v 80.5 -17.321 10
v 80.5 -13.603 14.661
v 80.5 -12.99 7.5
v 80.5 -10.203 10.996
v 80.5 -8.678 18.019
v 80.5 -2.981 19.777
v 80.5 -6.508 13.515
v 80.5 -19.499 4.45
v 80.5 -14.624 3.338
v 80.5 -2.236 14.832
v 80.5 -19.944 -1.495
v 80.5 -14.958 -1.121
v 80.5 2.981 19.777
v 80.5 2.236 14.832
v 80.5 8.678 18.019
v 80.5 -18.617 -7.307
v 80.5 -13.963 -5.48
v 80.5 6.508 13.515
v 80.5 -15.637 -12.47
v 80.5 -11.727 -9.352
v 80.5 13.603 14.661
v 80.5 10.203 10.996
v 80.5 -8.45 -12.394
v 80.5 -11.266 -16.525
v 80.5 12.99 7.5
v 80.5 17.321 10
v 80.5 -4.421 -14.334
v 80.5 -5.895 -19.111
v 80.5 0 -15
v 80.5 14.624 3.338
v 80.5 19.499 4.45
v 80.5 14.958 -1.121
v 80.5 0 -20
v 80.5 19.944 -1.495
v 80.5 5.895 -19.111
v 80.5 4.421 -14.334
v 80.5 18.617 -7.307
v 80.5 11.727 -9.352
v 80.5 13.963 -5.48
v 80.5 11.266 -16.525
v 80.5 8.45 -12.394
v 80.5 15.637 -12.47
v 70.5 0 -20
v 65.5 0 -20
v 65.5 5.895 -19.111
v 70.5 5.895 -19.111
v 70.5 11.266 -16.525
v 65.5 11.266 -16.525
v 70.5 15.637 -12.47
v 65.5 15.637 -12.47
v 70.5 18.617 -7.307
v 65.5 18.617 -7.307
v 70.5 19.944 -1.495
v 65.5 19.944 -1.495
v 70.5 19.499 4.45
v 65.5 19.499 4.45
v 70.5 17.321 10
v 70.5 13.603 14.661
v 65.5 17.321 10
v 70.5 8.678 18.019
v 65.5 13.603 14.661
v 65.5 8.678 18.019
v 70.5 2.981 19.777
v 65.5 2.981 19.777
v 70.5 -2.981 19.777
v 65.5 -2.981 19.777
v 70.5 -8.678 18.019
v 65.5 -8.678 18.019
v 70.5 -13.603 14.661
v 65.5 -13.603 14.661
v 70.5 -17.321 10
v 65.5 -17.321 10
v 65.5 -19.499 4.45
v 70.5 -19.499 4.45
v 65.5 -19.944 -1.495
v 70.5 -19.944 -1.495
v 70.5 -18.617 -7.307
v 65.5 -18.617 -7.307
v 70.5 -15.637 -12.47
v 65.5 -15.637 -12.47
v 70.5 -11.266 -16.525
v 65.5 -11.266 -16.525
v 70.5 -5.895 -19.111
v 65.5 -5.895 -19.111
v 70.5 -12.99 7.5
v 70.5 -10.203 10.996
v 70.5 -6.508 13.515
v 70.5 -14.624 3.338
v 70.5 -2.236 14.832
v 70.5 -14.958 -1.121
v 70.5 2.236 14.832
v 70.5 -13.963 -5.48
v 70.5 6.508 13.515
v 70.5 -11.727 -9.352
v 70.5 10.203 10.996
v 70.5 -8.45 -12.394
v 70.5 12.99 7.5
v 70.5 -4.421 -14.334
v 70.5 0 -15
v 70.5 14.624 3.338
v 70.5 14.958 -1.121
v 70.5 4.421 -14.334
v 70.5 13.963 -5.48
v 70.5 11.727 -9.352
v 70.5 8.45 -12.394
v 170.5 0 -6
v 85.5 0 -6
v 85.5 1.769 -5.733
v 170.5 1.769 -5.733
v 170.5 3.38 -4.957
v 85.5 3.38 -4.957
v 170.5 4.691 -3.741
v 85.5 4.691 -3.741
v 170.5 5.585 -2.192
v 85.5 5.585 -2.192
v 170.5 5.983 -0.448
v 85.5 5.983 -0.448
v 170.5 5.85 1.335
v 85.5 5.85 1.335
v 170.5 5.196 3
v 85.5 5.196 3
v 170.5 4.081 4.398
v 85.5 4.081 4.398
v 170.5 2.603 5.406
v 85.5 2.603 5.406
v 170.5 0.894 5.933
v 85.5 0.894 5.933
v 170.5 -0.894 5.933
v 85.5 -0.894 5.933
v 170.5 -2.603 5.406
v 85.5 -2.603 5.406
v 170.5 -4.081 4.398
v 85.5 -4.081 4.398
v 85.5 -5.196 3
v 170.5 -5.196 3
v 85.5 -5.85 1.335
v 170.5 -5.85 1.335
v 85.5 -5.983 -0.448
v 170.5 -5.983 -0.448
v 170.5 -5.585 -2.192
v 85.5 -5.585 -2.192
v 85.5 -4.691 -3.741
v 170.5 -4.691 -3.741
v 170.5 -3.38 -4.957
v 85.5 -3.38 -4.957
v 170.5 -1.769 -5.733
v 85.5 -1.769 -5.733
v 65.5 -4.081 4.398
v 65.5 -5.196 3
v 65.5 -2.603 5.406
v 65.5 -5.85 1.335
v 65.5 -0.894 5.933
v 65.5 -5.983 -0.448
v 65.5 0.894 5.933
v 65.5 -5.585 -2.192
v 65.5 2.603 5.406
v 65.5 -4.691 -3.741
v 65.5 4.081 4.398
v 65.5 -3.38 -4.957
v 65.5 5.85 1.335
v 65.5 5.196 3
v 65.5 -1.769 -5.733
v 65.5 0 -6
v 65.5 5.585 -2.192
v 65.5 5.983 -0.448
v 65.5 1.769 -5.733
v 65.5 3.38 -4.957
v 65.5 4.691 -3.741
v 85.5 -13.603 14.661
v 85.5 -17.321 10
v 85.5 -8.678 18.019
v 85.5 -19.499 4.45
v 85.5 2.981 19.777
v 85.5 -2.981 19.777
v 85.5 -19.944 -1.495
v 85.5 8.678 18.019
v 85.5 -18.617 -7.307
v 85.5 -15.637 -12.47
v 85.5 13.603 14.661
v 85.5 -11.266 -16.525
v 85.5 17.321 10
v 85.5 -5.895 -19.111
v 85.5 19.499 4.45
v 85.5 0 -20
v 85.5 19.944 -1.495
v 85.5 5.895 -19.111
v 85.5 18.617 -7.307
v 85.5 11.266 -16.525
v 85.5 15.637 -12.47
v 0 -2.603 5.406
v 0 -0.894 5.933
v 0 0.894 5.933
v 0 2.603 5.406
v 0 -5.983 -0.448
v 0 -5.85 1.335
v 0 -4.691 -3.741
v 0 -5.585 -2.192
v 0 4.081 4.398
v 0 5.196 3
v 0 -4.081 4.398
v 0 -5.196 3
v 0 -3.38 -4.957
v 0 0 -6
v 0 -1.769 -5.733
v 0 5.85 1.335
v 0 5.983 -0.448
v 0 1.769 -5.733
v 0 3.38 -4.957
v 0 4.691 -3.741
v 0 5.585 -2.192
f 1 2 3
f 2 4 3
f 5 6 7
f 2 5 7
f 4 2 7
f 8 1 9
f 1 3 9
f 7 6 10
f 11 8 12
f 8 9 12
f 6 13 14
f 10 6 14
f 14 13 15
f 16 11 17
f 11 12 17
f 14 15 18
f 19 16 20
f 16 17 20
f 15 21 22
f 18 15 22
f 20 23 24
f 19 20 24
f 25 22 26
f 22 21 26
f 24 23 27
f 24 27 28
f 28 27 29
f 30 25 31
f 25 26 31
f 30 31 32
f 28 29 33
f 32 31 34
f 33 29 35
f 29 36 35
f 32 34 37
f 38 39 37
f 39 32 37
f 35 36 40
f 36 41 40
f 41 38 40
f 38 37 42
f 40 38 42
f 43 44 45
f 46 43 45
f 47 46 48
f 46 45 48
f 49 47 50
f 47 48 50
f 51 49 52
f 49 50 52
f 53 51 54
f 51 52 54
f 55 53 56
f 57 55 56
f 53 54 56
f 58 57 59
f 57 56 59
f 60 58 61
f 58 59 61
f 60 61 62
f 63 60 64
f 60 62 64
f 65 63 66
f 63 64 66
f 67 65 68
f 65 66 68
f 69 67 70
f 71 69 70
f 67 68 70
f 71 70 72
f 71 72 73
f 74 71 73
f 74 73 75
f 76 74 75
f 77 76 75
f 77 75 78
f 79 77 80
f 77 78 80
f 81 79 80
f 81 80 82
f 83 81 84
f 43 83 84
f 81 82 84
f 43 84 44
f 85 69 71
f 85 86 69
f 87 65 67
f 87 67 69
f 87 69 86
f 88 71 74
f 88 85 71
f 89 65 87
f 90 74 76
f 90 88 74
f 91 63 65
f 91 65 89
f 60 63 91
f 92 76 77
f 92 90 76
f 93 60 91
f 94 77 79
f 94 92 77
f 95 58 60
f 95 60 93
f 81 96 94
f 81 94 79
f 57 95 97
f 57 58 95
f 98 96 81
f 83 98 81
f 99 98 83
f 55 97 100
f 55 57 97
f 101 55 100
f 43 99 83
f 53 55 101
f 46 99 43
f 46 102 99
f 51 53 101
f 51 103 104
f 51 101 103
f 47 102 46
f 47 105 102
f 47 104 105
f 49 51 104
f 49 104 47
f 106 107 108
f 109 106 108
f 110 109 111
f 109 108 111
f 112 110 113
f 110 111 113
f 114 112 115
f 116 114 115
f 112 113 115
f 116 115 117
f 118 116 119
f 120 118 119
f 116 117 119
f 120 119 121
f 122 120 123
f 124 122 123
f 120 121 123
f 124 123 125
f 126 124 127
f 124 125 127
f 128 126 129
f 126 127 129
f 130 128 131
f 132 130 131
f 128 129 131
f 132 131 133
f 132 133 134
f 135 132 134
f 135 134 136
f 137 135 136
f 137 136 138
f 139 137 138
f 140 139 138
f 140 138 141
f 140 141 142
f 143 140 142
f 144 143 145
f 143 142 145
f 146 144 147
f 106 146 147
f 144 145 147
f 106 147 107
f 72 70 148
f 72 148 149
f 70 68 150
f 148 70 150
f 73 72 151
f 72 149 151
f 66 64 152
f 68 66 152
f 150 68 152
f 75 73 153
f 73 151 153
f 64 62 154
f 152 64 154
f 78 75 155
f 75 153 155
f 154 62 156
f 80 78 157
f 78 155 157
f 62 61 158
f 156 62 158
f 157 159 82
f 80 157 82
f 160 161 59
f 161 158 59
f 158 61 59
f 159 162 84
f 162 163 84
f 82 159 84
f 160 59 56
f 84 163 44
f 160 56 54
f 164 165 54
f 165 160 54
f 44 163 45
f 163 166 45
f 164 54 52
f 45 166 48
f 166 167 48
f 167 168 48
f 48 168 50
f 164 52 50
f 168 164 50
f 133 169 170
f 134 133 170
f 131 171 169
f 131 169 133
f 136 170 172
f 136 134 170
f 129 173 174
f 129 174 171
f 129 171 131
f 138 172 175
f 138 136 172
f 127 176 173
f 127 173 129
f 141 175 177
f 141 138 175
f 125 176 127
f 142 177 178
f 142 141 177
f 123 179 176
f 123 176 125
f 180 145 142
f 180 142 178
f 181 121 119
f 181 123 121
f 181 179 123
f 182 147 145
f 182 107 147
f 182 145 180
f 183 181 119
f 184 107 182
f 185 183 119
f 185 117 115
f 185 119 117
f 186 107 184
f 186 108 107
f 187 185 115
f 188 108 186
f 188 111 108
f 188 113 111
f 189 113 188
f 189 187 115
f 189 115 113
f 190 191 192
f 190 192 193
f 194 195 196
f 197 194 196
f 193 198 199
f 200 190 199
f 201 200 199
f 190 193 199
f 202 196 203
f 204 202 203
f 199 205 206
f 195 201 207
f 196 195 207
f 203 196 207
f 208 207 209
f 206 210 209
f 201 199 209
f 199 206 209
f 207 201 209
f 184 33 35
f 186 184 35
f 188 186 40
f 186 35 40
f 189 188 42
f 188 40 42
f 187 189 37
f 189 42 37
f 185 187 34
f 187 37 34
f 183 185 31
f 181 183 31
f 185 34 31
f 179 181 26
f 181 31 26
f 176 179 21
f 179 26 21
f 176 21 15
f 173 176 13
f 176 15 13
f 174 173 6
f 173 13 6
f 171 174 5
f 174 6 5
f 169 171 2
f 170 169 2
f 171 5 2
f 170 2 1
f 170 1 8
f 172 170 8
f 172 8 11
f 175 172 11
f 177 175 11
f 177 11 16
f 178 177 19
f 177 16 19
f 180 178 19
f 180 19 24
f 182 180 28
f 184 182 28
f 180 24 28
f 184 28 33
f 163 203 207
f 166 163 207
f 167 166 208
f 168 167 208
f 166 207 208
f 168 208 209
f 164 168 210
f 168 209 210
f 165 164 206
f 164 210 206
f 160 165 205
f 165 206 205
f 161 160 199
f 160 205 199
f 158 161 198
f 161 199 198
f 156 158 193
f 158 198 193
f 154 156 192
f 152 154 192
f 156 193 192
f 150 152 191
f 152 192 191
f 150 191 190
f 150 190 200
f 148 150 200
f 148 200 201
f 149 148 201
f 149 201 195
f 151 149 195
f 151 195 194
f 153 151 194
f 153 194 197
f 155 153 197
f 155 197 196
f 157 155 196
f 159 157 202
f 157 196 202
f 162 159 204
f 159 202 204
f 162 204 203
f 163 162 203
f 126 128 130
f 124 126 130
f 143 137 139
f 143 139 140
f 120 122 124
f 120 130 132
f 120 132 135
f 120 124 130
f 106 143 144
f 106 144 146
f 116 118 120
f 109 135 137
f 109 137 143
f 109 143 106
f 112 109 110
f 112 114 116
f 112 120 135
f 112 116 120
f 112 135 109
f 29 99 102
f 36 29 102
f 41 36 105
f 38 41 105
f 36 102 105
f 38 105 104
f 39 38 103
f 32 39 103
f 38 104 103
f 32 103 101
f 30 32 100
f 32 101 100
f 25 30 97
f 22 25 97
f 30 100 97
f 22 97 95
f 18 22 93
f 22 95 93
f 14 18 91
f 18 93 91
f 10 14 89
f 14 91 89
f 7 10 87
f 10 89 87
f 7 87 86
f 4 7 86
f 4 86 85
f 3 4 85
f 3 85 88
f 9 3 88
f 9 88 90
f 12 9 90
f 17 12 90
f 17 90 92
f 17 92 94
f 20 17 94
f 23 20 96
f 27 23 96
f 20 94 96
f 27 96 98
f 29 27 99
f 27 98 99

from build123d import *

# Parameters (mm, degrees)
SKETCH1_R           = 6
BOSS_EXTRUDE1_DEPTH = 65.5
SKETCH2_R           = 20
BOSS_EXTRUDE2_DEPTH = 5
SKETCH3_R           = 15
BOSS_EXTRUDE3_DEPTH = 10
SKETCH4_R           = 20
BOSS_EXTRUDE4_DEPTH = 5
SKETCH5_R           = 6
BOSS_EXTRUDE5_DEPTH = 85


with BuildPart() as part:
    # Sketch1 → Boss-Extrude1 (new body)
    with BuildSketch(Plane(origin=(0, 0, 0), x_dir=(0, 0, -1), z_dir=(1, 0, 0))):
        Circle(SKETCH1_R)
    extrude(amount=BOSS_EXTRUDE1_DEPTH)

    # Sketch2 → Boss-Extrude2 (add)
    with BuildSketch(Plane(origin=(65.5, 0, 0), x_dir=(0, 0, -1), z_dir=(1, 0, 0))):
        Circle(SKETCH2_R)
    extrude(amount=BOSS_EXTRUDE2_DEPTH)

    # Sketch3 → Boss-Extrude3 (add)
    with BuildSketch(Plane(origin=(70.5, 0, 0), x_dir=(0, 0, -1), z_dir=(1, 0, 0))):
        Circle(SKETCH3_R)
    extrude(amount=BOSS_EXTRUDE3_DEPTH)

    # Sketch4 → Boss-Extrude4 (add)
    with BuildSketch(Plane(origin=(80.5, 0, 0), x_dir=(0, 0, -1), z_dir=(1, 0, 0))):
        Circle(SKETCH4_R)
    extrude(amount=BOSS_EXTRUDE4_DEPTH)

    # Sketch5 → Boss-Extrude5 (add)
    with BuildSketch(Plane(origin=(85.5, 0, 0), x_dir=(0, 0, -1), z_dir=(1, 0, 0))):
        Circle(SKETCH5_R)
    extrude(amount=BOSS_EXTRUDE5_DEPTH)


solid = part.part
